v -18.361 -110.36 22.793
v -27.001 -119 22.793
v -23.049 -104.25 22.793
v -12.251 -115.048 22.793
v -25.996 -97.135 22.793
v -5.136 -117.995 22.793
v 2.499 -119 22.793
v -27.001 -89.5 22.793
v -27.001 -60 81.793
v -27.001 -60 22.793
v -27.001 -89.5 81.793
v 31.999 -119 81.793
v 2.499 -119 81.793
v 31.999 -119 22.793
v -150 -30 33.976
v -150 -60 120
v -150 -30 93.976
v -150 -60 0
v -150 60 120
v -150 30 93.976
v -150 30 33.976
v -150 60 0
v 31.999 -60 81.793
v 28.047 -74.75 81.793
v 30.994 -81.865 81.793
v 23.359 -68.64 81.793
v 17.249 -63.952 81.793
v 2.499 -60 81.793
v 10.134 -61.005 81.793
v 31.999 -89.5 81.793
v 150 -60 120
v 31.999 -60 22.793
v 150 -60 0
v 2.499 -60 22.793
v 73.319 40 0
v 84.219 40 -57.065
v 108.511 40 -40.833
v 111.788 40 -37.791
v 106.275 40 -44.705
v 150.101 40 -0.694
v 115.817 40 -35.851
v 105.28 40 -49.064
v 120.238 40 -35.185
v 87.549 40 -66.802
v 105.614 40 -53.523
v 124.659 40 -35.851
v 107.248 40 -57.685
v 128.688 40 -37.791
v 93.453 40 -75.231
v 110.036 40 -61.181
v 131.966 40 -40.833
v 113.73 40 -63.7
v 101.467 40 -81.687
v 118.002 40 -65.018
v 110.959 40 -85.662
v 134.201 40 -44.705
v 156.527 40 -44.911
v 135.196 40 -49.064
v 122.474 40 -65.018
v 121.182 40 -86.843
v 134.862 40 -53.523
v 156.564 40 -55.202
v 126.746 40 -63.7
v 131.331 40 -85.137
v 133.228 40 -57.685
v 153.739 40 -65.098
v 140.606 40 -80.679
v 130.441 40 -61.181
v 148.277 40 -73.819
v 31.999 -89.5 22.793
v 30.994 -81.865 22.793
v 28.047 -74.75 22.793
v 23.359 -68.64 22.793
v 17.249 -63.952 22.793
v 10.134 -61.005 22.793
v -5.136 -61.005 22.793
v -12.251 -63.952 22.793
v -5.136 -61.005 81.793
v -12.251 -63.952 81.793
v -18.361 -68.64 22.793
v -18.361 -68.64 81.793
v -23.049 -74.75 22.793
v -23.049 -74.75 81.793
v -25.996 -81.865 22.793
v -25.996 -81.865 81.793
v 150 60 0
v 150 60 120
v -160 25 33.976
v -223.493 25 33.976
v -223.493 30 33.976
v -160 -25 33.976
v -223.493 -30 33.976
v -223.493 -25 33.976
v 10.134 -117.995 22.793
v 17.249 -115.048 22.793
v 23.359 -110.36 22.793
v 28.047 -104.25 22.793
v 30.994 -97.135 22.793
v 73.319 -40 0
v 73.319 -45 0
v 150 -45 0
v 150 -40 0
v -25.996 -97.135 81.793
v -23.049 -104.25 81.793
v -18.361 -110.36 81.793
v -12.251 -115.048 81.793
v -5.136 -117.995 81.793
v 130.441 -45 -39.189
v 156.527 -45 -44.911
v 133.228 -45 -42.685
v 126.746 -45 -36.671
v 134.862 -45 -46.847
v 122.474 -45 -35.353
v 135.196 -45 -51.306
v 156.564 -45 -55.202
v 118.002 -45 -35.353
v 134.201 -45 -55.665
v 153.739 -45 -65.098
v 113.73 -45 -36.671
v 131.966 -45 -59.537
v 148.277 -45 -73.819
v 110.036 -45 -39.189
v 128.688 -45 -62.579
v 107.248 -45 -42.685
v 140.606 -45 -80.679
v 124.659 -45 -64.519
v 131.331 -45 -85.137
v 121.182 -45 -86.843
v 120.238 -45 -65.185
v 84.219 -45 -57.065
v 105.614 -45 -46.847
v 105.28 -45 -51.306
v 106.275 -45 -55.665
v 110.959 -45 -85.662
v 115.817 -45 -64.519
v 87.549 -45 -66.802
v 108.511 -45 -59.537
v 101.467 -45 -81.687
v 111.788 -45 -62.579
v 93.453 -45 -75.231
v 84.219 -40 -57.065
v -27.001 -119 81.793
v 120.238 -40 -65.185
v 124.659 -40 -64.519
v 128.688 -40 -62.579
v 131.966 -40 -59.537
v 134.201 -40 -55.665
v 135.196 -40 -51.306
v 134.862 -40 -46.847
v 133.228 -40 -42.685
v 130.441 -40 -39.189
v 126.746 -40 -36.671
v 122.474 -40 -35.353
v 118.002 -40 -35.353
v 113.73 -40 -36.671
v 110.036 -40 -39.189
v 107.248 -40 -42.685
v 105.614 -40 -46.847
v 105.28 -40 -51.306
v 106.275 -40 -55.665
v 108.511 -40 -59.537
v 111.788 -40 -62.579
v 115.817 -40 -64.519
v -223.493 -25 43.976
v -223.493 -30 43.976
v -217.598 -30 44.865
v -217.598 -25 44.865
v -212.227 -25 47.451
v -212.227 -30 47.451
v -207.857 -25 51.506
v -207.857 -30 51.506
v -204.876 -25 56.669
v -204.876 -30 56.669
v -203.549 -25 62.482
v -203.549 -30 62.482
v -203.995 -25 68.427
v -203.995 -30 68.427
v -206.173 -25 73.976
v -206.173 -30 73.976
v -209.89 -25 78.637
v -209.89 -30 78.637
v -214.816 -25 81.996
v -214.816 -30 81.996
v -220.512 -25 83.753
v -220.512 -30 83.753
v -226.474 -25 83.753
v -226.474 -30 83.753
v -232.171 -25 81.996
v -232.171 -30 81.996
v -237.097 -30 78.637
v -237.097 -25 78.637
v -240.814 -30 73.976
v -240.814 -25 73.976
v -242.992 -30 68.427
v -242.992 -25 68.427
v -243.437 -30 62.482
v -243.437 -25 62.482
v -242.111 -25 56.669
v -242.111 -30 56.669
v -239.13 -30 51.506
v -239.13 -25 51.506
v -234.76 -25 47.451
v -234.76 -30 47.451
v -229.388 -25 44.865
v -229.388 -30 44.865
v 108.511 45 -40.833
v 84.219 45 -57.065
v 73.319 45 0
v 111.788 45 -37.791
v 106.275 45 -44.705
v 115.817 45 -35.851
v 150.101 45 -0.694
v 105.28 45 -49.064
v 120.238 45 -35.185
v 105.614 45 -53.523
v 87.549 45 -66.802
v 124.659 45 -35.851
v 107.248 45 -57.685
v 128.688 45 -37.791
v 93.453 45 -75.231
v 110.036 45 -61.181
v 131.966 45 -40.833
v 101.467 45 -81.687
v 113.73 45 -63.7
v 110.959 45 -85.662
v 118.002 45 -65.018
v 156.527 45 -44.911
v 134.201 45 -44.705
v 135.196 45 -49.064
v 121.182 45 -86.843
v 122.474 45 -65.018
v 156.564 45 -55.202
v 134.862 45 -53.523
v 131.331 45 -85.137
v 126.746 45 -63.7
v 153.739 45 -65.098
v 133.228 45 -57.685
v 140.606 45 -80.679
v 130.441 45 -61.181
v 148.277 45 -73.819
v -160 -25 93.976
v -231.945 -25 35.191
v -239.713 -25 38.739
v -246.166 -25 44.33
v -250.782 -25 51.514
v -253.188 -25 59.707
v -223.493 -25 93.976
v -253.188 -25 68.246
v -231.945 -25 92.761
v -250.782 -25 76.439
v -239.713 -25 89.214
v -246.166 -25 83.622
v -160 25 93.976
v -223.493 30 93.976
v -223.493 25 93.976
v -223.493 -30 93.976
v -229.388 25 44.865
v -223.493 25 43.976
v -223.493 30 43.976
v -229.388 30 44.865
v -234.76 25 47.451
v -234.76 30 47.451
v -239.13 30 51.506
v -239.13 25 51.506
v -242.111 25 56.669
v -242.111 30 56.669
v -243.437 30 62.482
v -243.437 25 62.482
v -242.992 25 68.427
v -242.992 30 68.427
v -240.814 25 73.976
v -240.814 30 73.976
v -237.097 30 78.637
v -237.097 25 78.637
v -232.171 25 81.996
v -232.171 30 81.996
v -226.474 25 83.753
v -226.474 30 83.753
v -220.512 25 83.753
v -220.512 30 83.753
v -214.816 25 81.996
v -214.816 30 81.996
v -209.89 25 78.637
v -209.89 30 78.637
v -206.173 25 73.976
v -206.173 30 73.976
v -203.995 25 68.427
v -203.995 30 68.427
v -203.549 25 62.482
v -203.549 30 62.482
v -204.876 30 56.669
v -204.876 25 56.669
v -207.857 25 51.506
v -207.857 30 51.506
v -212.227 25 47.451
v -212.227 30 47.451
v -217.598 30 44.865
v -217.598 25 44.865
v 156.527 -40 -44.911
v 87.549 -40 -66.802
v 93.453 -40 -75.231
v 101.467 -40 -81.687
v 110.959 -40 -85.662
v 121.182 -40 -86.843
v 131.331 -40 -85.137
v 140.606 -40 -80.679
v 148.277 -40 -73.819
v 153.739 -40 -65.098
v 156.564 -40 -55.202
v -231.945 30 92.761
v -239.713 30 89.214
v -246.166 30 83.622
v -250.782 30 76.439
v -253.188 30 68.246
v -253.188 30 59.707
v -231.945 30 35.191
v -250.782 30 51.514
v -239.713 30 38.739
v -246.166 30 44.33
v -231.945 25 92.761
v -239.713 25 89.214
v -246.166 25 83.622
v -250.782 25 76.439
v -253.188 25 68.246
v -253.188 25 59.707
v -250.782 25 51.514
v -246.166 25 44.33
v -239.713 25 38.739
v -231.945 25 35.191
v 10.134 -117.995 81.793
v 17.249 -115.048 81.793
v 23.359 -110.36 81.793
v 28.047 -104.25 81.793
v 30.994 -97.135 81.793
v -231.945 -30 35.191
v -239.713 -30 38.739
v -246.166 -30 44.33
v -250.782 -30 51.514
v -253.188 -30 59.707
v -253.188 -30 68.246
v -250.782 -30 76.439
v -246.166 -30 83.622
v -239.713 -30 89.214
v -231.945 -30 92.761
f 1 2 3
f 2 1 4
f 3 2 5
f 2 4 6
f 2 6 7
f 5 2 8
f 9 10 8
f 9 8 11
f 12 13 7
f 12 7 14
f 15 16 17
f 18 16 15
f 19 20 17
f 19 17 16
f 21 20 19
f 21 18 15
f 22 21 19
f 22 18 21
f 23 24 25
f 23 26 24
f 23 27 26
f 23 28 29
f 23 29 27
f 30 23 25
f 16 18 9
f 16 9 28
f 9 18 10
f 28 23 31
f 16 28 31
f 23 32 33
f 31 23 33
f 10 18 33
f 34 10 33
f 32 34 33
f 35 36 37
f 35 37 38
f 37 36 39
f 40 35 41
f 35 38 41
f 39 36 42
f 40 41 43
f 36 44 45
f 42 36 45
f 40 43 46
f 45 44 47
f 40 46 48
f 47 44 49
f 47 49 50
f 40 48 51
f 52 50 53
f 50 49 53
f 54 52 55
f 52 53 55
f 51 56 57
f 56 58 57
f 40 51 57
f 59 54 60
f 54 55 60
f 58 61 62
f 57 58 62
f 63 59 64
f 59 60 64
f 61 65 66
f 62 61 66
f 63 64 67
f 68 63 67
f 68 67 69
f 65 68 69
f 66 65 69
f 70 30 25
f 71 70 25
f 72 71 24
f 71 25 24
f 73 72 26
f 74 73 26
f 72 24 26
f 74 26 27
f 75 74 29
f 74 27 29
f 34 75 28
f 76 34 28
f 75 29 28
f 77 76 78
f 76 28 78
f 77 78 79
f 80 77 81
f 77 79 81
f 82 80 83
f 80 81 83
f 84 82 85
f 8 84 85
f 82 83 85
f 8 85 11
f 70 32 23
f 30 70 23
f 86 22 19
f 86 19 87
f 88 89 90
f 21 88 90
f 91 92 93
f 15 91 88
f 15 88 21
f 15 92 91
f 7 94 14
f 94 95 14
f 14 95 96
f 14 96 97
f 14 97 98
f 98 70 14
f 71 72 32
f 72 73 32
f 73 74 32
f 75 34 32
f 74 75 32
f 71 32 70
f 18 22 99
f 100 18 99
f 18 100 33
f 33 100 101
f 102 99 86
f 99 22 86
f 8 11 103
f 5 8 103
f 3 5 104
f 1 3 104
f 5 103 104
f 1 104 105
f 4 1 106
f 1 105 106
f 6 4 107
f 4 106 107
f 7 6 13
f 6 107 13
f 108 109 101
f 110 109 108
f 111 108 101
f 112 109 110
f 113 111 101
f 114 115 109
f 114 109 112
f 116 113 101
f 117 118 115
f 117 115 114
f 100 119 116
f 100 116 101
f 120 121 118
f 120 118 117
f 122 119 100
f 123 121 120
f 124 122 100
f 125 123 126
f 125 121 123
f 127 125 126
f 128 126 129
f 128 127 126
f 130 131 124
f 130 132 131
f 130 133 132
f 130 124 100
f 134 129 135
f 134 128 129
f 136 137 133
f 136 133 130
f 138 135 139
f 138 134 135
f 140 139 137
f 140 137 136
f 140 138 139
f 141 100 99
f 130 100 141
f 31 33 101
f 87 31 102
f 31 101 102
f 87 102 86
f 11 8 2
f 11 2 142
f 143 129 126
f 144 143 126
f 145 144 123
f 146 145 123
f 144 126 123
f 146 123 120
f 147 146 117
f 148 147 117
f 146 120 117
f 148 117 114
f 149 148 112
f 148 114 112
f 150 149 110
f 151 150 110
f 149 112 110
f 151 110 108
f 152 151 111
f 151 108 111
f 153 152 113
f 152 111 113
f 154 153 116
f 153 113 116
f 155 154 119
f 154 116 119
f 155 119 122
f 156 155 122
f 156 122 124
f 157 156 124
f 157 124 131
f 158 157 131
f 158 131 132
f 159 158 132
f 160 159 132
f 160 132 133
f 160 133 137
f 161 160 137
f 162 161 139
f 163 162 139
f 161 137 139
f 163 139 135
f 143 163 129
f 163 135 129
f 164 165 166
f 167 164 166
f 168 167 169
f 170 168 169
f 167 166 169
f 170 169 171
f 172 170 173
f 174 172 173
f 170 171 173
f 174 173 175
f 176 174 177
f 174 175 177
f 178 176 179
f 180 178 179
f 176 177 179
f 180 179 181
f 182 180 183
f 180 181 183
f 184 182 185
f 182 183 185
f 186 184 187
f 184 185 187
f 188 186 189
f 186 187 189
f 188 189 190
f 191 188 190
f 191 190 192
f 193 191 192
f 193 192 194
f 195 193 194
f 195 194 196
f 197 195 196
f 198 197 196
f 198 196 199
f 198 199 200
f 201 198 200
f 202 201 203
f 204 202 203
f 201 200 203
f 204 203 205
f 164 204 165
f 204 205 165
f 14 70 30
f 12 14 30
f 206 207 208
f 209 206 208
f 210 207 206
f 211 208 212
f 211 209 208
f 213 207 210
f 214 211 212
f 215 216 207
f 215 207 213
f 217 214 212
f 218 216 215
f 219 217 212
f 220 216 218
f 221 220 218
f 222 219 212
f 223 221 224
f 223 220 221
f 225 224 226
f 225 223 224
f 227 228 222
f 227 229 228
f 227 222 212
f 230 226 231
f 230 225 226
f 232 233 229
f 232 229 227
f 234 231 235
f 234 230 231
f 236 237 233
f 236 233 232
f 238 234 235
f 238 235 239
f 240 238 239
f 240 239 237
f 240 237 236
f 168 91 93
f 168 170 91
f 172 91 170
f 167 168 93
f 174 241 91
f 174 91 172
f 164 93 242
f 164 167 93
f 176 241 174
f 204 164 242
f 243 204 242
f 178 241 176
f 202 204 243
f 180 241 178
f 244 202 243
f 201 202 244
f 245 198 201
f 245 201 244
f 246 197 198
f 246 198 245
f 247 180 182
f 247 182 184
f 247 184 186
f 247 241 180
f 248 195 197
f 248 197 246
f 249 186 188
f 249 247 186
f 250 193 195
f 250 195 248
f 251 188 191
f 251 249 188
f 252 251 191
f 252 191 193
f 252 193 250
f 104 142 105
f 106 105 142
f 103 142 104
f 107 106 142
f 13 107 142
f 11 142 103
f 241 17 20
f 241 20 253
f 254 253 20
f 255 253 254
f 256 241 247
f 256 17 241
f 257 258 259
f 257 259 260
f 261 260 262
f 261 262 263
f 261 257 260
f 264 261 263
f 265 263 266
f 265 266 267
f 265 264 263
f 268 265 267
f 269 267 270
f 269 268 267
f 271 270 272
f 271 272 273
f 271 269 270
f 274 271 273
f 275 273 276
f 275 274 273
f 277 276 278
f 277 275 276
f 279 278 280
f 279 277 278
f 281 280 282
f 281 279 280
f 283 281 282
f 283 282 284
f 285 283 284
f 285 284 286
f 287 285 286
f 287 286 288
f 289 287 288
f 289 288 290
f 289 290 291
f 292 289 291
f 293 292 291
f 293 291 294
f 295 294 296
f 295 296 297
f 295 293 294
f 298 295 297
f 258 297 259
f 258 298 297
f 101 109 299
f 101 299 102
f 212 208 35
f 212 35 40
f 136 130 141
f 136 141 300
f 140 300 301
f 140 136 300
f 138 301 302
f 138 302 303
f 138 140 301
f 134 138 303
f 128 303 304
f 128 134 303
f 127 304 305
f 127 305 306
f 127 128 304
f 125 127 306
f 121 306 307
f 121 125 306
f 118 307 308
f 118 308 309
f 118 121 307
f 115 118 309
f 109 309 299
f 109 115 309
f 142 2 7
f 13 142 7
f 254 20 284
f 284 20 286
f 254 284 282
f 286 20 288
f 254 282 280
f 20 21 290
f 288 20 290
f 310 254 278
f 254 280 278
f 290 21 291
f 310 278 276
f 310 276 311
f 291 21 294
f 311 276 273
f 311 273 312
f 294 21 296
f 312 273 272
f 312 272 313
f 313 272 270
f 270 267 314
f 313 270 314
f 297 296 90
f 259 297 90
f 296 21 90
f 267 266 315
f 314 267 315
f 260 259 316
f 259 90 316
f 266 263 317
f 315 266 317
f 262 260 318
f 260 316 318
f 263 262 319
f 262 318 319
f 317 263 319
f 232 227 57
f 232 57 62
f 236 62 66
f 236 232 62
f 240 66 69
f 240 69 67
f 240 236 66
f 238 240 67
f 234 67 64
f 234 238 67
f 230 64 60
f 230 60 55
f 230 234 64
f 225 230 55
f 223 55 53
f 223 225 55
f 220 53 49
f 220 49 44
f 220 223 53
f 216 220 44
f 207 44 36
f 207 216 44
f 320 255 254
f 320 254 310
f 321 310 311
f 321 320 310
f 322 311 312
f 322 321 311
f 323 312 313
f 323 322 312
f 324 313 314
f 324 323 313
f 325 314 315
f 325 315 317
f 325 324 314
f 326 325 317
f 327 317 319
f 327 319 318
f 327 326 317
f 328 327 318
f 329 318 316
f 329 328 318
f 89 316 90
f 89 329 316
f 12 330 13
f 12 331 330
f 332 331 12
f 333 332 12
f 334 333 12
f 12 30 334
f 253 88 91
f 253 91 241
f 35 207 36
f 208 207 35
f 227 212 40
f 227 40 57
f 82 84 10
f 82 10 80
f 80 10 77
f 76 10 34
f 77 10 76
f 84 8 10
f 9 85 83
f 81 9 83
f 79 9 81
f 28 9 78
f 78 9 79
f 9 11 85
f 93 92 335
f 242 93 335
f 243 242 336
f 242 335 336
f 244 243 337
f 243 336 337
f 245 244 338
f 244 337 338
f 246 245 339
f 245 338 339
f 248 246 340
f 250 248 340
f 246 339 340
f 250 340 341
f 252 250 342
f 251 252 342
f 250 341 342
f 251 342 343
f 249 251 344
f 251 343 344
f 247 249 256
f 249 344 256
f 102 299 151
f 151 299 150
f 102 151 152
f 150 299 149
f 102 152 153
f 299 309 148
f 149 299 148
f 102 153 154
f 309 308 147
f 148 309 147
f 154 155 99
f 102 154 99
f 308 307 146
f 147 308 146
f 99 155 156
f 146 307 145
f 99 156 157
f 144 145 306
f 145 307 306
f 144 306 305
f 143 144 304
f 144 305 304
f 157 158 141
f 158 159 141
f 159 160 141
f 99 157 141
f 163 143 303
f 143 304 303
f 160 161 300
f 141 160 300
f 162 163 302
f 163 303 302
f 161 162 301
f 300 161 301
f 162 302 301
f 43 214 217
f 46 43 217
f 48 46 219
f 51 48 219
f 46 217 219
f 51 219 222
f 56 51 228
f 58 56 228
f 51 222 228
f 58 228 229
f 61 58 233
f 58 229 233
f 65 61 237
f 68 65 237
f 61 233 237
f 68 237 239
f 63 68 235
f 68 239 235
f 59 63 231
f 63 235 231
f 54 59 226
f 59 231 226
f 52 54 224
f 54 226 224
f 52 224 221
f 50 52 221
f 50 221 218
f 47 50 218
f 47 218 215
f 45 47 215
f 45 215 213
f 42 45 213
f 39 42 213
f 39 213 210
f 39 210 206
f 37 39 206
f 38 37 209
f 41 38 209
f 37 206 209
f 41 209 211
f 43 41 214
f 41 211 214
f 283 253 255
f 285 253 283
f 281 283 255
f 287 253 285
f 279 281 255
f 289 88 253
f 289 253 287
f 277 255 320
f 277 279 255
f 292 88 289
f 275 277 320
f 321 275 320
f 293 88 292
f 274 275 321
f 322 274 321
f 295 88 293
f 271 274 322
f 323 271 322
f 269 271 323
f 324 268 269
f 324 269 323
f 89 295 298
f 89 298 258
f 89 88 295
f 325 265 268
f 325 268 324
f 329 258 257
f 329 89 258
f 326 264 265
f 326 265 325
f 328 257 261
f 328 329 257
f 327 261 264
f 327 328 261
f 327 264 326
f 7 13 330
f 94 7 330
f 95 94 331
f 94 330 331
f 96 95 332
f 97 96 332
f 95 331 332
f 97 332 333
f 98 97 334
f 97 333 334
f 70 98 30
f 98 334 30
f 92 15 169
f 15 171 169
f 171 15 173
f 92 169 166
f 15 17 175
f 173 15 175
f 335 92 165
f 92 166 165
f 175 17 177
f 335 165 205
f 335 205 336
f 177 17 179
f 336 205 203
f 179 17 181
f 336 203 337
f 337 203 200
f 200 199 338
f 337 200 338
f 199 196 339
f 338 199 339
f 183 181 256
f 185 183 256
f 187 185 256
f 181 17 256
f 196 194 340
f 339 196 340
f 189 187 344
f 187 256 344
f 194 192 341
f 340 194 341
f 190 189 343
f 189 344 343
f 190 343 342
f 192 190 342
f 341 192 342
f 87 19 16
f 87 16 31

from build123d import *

# Parameters (mm, degrees)
SKETCH_1_W          = 300
SKETCH_1_H          = 120
EXTRUDE_1_DEPTH     = 120
SKETCH_4_R          = 15
EXTRUDE_2_DEPTH     = 5
SKETCH_8_R          = 15
EXTRUDE_3_DEPTH     = 5
SKETCH_9_W          = 60
SKETCH_9_H          = 60
EXTRUDE_4_DEPTH     = 10
SKETCH_10_R         = 20
EXTRUDE_6_DEPTH     = 5
EXTRUDE_START       = -5
SKETCH_11_R         = 20
EXTRUDE_7_DEPTH     = 5
SKETCH_12_W         = 59
SKETCH_12_H         = 59
EXTRUDE_8_DEPTH     = 59
SKETCH_13_R         = 29.5
CUT_EXTRUDE_2_DEPTH = 59


with BuildPart() as part:
    # 草图1 → 凸台-拉伸1 (new body)
    with BuildSketch(Plane.XY):
        Rectangle(SKETCH_1_W, SKETCH_1_H)
    extrude(amount=EXTRUDE_1_DEPTH)

    # 草图4 → 凸台-拉伸2 (add)
    with BuildSketch(Plane(origin=(0, -45, 0), x_dir=(-1, 0, 0), z_dir=(0, -1, 0))):
        with BuildLine():
            Line((-156.527175932, 44.910966087), (-150, 0))
            Line((-150, 0), (-73.31889354, 0))
            Line((-73.31889354, 0), (-84.21897449, 57.065129679))
            ThreePointArc((-84.21897449, 57.065129679), (-126.316684667, 86.348087805), (-156.527175932, 44.910966087))
        make_face()
        with Locations(Location((-120.238104214, 50.185071192, 0), (0, 0, 90))):
            Circle(SKETCH_4_R, mode=Mode.SUBTRACT)
    extrude(amount=-EXTRUDE_2_DEPTH)

    # 草图9 → 凸台-拉伸4 (add)
    with BuildSketch(Plane.ZY.offset(150)):
        with Locations((63.976226304, 0)):
            Rectangle(SKETCH_9_W, SKETCH_9_H)
    extrude(amount=EXTRUDE_4_DEPTH)

    # 草图10 → 凸台-拉伸6 (add)
    with BuildSketch(Plane.XZ.offset(30)):
        with BuildLine():
            ThreePointArc((-223.493282039, 33.976226304), (-253.493282039, 63.976226304), (-223.493282039, 93.976226304))
            Line((-223.493282039, 93.976226304), (-160, 93.976226304))
            Line((-160, 93.976226304), (-160, 33.976226304))
            Line((-160, 33.976226304), (-223.493282039, 33.976226304))
        make_face()
        with Locations(Location((-223.493282039, 63.976226304, 0), (0, 0, 270))):
            Circle(SKETCH_10_R, mode=Mode.SUBTRACT)
    extrude(amount=-EXTRUDE_6_DEPTH)

    # 草图11 → 凸台-拉伸7 (add)
    with BuildSketch(Plane(origin=(0, 30, 0), x_dir=(1, 0, 0), z_dir=(0, 1, 0)).offset(EXTRUDE_START)):
        with BuildLine():
            Line((-223.493282039, -33.976226304), (-160, -33.976226304))
            Line((-160, -33.976226304), (-160, -93.976226304))
            Line((-160, -93.976226304), (-223.493282039, -93.976226304))
            ThreePointArc((-223.493282039, -93.976226304), (-253.493282039, -63.976226304), (-223.493282039, -33.976226304))
        make_face()
        with Locations(Location((-223.493282039, -63.976226304, 0), (0, 0, 90))):
            Circle(SKETCH_11_R, mode=Mode.SUBTRACT)
    extrude(amount=EXTRUDE_7_DEPTH)

    # 草图12 → 凸台-拉伸8 (add)
    with BuildSketch(Plane.XZ.offset(60)):
        with Locations((2.49896869, 52.292933775)):
            Rectangle(SKETCH_12_W, SKETCH_12_H)
    extrude(amount=EXTRUDE_8_DEPTH)

    # 草图13 → 切除-拉伸2 (cut)
    with BuildSketch(Plane.XY.offset(81.792933775)):
        with Locations((2.49896869, -89.5)):
            Circle(SKETCH_13_R)
    extrude(amount=-CUT_EXTRUDE_2_DEPTH, mode=Mode.SUBTRACT)


with BuildPart() as body_2:
    # 草图8 → 凸台-拉伸3 (new body)
    with BuildSketch(Plane(origin=(0, 45, 0), x_dir=(1, 0, 0), z_dir=(0, 1, 0))):
        with BuildLine():
            Line((84.21897449, 57.065129679), (73.31889354, 0))
            Line((73.31889354, 0), (150.100867109, 0.694027454))
            Line((150.100867109, 0.694027454), (156.527175932, 44.910966087))
            ThreePointArc((156.527175932, 44.910966087), (126.316684667, 86.348087805), (84.21897449, 57.065129679))
        make_face()
        with Locations(Location((120.238104214, 50.185071192, 0), (0, 0, 270))):
            Circle(SKETCH_8_R, mode=Mode.SUBTRACT)
    extrude(amount=-EXTRUDE_3_DEPTH)


with BuildPart() as cut_extrude_2_piece_1:
    # of the separate pieces the step leaves, piece 1, a body of its own (cut_extrude_2_pieces)
    add(part.part.solids().sort_by_distance((-150, -60, 0))[0])


with BuildPart() as cut_extrude_2_piece_2:
    # of the separate pieces the step leaves, piece 2, a body of its own (cut_extrude_2_pieces)
    add(part.part.solids().sort_by_distance((-27.00103131, -119, 22.792933775))[0])


with BuildPart() as cut_extrude_2_piece_3:
    # of the separate pieces the step leaves, piece 3, a body of its own (cut_extrude_2_pieces)
    add(part.part.solids().sort_by_distance((31.99896869, -119, 81.792933775))[0])


solid = Compound([body_2.part, cut_extrude_2_piece_1.part, cut_extrude_2_piece_2.part, cut_extrude_2_piece_3.part])
